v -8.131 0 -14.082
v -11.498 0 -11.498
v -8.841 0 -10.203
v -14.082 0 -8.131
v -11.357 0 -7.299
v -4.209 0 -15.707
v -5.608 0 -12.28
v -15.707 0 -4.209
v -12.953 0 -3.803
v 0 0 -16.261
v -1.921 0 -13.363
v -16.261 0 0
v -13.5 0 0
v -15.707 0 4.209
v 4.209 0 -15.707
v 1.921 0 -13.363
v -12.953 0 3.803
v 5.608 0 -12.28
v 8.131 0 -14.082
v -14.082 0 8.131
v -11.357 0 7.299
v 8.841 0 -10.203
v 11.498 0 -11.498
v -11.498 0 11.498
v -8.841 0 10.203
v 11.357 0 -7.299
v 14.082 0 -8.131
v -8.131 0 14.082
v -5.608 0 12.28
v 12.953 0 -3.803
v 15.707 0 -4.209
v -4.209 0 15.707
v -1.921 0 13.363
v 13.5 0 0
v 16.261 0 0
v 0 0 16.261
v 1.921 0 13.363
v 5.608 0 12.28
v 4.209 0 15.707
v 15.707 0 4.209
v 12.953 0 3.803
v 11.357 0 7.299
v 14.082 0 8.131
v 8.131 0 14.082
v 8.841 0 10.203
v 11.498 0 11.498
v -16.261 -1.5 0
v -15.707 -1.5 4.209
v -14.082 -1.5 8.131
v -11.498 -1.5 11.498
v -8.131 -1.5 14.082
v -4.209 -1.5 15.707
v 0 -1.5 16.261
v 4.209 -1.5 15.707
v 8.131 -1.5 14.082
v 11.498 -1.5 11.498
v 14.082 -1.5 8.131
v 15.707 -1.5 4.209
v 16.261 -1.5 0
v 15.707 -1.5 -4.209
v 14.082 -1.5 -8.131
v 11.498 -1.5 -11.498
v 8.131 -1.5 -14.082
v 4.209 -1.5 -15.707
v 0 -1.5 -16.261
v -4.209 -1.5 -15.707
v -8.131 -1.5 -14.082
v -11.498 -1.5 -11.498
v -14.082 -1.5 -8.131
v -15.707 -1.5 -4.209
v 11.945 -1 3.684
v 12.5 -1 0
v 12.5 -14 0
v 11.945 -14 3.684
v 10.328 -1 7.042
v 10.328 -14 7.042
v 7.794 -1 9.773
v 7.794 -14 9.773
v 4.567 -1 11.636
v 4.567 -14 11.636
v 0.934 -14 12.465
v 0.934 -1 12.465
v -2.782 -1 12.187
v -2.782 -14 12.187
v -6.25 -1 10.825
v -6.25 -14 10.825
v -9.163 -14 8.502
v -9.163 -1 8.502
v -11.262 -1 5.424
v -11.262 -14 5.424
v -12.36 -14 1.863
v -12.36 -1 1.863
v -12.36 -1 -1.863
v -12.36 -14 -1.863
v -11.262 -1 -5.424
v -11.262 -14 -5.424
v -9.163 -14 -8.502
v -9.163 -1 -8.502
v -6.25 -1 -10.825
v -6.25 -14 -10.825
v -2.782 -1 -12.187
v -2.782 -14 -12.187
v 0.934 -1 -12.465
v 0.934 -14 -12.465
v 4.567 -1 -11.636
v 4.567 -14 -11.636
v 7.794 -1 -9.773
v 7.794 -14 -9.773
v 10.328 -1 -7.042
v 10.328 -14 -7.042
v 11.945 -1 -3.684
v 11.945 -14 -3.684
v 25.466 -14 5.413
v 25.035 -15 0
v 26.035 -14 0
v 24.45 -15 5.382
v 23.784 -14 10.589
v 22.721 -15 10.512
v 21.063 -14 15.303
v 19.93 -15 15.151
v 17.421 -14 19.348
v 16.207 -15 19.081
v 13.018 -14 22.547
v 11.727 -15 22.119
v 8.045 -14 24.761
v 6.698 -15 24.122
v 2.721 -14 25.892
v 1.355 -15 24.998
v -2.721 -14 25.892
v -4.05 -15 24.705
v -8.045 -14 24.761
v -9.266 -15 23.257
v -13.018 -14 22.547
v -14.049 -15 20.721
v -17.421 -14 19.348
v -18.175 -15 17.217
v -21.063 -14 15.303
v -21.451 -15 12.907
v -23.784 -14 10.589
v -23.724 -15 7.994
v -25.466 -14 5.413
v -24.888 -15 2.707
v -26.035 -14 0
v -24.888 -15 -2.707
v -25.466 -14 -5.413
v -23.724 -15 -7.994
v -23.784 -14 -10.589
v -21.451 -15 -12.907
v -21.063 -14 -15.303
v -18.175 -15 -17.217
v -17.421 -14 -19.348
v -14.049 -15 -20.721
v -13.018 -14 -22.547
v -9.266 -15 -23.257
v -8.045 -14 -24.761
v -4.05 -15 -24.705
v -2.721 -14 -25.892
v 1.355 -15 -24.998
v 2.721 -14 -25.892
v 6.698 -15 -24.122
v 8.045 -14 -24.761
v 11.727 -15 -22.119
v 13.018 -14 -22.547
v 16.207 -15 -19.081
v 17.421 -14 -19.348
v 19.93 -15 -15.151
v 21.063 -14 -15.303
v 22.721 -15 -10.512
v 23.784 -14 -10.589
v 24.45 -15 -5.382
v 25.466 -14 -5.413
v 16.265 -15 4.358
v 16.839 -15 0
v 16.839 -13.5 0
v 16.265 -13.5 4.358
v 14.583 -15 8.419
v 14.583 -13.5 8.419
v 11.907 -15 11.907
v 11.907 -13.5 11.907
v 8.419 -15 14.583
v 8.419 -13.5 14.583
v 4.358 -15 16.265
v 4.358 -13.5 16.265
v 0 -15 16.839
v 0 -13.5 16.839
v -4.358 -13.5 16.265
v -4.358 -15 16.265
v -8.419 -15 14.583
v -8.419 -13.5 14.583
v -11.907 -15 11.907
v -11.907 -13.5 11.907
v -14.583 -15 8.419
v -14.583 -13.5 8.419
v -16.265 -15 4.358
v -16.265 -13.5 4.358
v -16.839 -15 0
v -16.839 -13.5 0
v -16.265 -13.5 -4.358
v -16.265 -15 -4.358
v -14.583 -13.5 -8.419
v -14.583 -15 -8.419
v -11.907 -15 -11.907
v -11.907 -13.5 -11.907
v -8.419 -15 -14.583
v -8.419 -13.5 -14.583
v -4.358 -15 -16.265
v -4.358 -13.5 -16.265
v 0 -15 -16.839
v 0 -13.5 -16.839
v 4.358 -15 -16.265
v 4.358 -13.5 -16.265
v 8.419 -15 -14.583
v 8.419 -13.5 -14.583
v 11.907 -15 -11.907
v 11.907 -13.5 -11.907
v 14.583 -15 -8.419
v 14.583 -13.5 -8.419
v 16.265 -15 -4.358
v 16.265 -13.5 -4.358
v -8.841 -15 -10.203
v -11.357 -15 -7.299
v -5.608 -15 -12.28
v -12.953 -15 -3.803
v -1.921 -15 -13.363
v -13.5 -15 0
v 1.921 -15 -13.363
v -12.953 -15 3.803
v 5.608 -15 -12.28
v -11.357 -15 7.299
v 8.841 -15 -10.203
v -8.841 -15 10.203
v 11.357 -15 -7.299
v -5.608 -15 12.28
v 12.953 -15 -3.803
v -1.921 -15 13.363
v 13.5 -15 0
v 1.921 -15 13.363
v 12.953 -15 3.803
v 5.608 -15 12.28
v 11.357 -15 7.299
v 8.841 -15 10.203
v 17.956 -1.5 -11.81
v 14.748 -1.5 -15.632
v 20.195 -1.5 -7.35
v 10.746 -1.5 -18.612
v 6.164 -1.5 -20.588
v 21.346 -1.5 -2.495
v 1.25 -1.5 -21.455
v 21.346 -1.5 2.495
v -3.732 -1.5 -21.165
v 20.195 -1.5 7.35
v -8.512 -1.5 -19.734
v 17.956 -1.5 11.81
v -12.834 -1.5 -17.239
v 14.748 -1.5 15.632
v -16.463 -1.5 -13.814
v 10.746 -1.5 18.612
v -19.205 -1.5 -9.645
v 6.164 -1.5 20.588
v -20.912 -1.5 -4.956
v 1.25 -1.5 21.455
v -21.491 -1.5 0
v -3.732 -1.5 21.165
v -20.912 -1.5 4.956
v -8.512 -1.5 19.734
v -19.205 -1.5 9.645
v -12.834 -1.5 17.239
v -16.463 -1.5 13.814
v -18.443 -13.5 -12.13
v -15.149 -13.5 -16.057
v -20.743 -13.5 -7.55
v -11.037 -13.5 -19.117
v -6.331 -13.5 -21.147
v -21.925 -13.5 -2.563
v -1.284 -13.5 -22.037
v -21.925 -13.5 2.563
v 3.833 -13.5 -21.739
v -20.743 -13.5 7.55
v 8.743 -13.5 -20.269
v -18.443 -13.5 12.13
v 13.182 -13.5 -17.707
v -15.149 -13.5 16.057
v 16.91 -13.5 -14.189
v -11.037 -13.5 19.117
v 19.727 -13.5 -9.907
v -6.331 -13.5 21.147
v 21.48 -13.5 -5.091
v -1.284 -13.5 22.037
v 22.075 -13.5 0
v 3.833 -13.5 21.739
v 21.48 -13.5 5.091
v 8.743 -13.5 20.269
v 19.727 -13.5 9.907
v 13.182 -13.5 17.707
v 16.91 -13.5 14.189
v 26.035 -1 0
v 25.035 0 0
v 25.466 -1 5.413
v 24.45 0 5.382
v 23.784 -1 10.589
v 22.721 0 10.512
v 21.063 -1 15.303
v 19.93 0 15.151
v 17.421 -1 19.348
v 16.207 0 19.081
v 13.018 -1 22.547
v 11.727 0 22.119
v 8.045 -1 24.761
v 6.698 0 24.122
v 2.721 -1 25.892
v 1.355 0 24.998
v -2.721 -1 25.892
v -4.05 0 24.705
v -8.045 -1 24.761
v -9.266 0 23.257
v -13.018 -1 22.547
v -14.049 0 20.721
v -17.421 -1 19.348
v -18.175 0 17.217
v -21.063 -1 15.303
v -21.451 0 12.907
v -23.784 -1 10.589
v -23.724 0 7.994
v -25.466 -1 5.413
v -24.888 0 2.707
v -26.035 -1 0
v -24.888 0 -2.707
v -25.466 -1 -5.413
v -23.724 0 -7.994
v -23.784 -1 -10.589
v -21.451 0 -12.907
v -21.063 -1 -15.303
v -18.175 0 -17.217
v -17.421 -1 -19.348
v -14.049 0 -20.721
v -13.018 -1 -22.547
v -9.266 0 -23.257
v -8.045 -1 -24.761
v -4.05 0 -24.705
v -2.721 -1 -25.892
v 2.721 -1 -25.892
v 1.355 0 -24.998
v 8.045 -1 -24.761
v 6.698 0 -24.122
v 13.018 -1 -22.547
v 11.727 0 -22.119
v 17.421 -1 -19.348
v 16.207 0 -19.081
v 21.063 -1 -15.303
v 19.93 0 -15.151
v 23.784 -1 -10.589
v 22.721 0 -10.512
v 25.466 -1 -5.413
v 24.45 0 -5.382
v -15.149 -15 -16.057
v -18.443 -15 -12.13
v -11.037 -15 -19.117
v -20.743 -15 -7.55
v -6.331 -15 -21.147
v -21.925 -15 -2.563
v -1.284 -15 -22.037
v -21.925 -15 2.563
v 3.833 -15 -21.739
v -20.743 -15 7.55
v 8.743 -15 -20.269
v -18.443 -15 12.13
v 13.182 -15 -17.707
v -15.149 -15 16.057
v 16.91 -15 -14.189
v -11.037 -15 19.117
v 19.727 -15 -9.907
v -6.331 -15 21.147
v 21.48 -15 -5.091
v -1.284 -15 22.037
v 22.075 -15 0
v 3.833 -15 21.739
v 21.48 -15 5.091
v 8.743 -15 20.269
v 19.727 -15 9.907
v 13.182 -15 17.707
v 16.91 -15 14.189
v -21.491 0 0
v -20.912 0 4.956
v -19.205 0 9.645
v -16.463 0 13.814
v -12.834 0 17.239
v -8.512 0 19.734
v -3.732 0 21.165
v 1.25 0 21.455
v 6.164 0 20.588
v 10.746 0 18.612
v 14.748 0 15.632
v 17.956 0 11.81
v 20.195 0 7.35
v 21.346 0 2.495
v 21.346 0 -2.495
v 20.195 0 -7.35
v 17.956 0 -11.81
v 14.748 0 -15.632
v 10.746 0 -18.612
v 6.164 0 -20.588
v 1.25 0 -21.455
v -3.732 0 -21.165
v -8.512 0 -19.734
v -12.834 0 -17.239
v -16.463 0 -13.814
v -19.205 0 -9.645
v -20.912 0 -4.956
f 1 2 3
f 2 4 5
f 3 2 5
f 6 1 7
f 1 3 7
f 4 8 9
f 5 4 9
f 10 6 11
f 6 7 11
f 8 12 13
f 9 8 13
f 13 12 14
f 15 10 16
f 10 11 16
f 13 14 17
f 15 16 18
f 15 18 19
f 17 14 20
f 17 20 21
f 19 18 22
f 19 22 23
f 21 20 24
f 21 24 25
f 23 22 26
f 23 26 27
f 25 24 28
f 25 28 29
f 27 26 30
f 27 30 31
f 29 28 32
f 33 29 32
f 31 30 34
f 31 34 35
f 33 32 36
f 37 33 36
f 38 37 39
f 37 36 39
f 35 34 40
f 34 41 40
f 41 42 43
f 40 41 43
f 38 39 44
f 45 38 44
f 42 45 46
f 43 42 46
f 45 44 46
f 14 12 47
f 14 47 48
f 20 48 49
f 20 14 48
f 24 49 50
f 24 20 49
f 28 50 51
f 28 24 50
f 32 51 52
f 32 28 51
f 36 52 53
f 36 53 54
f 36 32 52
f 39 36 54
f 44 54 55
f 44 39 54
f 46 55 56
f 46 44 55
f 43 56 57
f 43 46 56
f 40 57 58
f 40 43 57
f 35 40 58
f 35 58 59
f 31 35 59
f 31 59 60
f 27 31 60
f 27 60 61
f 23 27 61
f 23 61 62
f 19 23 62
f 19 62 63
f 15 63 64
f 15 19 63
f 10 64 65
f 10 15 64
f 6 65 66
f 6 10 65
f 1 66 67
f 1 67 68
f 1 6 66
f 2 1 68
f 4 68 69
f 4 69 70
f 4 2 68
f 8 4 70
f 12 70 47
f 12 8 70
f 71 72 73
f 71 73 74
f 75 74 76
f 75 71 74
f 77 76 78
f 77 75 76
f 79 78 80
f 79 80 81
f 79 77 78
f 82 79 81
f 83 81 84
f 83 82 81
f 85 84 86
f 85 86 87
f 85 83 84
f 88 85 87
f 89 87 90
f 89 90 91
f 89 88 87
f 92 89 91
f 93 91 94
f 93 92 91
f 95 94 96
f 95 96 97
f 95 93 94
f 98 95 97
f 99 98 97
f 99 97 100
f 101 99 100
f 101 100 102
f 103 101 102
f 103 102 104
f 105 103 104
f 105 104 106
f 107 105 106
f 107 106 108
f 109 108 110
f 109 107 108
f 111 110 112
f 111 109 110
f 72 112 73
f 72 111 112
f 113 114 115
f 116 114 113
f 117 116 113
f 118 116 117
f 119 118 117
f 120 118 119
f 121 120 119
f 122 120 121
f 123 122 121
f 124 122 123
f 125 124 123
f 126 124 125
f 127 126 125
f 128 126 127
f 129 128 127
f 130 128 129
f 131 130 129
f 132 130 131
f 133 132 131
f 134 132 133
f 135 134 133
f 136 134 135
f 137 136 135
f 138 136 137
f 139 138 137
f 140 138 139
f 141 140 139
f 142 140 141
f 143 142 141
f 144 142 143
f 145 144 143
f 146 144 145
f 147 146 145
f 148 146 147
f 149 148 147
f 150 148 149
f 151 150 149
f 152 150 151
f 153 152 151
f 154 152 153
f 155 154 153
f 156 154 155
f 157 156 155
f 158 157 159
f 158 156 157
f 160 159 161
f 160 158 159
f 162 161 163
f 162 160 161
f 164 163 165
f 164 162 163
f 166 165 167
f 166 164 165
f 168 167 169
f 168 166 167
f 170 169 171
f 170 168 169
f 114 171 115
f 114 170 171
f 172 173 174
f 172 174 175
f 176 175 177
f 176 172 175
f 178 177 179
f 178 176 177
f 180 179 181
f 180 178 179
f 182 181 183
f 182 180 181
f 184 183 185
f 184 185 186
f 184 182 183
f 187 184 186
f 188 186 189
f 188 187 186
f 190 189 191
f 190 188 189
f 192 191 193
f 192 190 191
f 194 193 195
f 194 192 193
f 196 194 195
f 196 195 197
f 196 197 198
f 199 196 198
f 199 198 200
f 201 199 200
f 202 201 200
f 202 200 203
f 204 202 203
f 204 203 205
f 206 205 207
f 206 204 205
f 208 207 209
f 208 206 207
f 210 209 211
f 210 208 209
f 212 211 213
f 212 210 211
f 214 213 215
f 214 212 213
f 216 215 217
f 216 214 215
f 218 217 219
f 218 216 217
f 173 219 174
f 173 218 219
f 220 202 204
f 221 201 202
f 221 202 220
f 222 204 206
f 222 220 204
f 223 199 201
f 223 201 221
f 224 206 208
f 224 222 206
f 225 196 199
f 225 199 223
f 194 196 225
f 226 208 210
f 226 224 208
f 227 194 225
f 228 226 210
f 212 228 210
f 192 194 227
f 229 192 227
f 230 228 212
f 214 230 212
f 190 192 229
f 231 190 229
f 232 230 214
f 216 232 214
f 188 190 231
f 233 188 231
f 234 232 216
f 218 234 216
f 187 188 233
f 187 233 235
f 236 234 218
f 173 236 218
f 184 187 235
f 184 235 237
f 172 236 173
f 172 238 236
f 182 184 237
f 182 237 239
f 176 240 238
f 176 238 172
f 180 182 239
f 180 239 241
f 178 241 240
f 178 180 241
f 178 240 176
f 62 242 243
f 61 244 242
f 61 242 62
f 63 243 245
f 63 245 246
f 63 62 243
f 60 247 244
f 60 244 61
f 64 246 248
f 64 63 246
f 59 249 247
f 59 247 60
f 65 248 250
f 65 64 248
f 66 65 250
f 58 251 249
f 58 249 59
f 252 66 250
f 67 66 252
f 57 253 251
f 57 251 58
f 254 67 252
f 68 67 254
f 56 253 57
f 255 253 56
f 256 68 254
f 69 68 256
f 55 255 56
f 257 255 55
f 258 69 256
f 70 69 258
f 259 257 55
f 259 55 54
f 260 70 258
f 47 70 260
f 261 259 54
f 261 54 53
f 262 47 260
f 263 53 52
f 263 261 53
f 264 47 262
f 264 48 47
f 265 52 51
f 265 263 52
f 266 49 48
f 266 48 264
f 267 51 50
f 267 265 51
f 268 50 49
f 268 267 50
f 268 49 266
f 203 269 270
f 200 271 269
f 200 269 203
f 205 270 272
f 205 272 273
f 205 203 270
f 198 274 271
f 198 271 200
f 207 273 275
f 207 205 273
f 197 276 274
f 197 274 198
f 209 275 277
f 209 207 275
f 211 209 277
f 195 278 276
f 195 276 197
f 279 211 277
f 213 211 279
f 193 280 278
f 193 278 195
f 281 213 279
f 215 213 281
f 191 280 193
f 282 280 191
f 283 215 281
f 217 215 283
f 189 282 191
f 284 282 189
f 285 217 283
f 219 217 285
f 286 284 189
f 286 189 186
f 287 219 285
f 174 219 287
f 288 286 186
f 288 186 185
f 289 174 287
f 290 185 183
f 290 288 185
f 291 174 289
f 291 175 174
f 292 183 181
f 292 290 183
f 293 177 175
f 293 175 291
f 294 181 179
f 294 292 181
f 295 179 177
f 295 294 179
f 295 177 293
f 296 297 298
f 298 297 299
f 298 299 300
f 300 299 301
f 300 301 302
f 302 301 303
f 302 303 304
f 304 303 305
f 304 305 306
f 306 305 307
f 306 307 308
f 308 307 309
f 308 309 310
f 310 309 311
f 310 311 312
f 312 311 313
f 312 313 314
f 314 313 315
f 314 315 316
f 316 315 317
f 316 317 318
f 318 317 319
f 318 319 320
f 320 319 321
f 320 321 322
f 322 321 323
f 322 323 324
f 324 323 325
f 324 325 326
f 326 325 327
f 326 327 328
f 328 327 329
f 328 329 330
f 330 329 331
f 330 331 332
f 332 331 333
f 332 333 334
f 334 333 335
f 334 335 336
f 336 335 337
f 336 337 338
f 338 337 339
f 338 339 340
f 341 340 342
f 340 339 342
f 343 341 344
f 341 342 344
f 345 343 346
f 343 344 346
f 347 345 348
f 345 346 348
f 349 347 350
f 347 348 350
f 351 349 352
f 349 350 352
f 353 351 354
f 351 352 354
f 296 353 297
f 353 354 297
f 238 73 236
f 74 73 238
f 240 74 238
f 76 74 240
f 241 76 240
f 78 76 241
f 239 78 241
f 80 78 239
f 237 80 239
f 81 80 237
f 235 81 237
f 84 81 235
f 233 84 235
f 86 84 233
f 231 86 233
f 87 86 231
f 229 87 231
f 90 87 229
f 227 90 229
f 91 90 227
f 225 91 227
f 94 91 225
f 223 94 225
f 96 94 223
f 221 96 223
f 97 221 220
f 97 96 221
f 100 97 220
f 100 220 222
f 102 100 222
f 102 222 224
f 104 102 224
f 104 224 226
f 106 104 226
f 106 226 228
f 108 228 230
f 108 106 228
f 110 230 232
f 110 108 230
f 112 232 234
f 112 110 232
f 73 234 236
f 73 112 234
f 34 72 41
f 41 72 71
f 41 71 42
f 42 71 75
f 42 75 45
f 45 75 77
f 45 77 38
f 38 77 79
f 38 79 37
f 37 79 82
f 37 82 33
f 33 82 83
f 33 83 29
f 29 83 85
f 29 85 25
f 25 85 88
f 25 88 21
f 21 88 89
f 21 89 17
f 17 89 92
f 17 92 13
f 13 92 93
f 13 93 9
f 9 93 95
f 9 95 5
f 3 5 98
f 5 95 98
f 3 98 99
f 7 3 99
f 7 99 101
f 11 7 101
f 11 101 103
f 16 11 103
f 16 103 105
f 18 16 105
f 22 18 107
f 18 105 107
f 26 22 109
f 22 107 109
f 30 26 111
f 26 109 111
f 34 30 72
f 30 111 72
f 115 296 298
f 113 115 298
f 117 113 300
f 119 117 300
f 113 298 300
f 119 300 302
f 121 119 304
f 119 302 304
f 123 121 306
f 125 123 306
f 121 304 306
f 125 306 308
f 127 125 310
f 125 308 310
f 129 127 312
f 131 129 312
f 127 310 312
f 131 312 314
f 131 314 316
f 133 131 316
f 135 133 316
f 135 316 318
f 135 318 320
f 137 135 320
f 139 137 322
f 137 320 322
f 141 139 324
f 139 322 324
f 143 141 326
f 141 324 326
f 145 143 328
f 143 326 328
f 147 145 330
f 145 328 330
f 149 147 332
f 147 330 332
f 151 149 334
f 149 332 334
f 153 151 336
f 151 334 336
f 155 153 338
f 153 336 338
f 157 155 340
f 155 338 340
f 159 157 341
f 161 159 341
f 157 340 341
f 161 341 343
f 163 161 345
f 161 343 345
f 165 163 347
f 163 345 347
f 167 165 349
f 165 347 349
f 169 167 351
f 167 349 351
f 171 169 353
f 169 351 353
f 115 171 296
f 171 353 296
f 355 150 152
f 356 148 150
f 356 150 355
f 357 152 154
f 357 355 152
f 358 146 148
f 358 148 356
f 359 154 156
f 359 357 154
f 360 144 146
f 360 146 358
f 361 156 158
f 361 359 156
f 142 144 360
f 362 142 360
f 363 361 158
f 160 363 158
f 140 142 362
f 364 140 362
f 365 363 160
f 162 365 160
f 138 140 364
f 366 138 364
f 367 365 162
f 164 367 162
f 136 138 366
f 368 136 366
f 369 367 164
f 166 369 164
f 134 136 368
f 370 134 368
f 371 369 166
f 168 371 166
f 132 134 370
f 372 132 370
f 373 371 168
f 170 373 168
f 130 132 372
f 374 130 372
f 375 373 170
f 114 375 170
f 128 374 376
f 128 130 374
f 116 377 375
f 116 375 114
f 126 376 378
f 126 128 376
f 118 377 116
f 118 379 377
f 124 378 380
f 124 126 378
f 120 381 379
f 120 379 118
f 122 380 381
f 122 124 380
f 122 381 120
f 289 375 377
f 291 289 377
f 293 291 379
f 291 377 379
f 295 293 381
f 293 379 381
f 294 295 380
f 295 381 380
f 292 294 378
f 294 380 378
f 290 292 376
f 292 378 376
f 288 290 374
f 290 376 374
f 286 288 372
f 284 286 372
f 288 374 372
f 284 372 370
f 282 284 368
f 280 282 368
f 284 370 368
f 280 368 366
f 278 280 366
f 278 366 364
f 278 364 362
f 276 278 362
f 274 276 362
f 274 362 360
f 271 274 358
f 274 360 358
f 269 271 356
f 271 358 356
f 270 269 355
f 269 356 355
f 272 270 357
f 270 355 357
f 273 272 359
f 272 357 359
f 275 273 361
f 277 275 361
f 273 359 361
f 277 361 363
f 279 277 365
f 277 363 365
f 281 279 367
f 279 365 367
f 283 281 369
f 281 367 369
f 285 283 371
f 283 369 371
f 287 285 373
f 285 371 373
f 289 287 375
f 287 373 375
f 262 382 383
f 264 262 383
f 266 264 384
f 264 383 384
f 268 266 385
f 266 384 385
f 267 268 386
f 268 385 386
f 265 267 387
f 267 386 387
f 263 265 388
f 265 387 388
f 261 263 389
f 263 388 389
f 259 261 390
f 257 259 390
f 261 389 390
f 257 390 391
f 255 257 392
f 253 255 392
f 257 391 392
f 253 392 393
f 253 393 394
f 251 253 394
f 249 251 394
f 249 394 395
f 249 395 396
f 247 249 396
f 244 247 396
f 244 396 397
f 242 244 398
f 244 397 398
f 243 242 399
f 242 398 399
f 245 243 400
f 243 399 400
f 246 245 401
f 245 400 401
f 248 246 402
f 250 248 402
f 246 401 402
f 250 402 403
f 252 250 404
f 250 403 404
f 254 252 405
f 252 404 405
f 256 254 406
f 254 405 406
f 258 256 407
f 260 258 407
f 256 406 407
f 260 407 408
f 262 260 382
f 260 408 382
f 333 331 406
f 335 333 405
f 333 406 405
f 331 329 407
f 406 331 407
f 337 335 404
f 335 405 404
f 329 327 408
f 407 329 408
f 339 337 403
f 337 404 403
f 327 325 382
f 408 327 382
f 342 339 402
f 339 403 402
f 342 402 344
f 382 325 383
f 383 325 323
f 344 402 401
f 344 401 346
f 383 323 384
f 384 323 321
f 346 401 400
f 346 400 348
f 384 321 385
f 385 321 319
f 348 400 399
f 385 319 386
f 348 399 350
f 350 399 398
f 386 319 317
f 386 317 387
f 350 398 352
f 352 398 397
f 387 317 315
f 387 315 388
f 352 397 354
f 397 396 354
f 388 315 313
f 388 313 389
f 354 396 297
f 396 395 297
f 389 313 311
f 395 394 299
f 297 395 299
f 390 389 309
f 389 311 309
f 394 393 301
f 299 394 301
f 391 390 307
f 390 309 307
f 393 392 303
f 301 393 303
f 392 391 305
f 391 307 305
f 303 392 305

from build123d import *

# Parameters (mm, degrees)
F0_R     = 26.035
F0_R_2   = 12.5
F1_DEPTH = 15
F2_R     = 22.074638
F2_R_2   = 16.838659
F3_DEPTH = 1.5
F4_R     = 21.491301
F4_R_2   = 16.261001
F5_DEPTH = 1.5
F6_SIZE  = 1


with BuildPart() as f1:
    # F0 (on Front) → F1 (new body)
    with BuildSketch(Plane.XZ):
        Circle(F0_R)
        Circle(F0_R_2, mode=Mode.SUBTRACT)
    extrude(amount=F1_DEPTH)

    # F2 (on face) → F3 (cut)
    with BuildSketch(Plane.XZ.offset(15)):
        Circle(F2_R)
        Circle(F2_R_2, mode=Mode.SUBTRACT)
    extrude(amount=-F3_DEPTH, mode=Mode.SUBTRACT)

    # F4 (on face) → F5 (cut)
    with BuildSketch(Plane(origin=(0, 0, 0), x_dir=(-1, 0, 0), z_dir=(0, 1, 0))):
        Circle(F4_R)
        Circle(F4_R_2, mode=Mode.SUBTRACT)
    extrude(amount=-F5_DEPTH, mode=Mode.SUBTRACT)

    # F6
    f6_edges = [f1.edges().sort_by_distance(p)[0] for p in [
        (-26.035, 0, 0),
        (-26.035, -15, 0),
        (-12.5, -15, 0),
        (-12.5, 0, 0),
    ]]
    chamfer(f6_edges, length=F6_SIZE)


solid = f1.part
